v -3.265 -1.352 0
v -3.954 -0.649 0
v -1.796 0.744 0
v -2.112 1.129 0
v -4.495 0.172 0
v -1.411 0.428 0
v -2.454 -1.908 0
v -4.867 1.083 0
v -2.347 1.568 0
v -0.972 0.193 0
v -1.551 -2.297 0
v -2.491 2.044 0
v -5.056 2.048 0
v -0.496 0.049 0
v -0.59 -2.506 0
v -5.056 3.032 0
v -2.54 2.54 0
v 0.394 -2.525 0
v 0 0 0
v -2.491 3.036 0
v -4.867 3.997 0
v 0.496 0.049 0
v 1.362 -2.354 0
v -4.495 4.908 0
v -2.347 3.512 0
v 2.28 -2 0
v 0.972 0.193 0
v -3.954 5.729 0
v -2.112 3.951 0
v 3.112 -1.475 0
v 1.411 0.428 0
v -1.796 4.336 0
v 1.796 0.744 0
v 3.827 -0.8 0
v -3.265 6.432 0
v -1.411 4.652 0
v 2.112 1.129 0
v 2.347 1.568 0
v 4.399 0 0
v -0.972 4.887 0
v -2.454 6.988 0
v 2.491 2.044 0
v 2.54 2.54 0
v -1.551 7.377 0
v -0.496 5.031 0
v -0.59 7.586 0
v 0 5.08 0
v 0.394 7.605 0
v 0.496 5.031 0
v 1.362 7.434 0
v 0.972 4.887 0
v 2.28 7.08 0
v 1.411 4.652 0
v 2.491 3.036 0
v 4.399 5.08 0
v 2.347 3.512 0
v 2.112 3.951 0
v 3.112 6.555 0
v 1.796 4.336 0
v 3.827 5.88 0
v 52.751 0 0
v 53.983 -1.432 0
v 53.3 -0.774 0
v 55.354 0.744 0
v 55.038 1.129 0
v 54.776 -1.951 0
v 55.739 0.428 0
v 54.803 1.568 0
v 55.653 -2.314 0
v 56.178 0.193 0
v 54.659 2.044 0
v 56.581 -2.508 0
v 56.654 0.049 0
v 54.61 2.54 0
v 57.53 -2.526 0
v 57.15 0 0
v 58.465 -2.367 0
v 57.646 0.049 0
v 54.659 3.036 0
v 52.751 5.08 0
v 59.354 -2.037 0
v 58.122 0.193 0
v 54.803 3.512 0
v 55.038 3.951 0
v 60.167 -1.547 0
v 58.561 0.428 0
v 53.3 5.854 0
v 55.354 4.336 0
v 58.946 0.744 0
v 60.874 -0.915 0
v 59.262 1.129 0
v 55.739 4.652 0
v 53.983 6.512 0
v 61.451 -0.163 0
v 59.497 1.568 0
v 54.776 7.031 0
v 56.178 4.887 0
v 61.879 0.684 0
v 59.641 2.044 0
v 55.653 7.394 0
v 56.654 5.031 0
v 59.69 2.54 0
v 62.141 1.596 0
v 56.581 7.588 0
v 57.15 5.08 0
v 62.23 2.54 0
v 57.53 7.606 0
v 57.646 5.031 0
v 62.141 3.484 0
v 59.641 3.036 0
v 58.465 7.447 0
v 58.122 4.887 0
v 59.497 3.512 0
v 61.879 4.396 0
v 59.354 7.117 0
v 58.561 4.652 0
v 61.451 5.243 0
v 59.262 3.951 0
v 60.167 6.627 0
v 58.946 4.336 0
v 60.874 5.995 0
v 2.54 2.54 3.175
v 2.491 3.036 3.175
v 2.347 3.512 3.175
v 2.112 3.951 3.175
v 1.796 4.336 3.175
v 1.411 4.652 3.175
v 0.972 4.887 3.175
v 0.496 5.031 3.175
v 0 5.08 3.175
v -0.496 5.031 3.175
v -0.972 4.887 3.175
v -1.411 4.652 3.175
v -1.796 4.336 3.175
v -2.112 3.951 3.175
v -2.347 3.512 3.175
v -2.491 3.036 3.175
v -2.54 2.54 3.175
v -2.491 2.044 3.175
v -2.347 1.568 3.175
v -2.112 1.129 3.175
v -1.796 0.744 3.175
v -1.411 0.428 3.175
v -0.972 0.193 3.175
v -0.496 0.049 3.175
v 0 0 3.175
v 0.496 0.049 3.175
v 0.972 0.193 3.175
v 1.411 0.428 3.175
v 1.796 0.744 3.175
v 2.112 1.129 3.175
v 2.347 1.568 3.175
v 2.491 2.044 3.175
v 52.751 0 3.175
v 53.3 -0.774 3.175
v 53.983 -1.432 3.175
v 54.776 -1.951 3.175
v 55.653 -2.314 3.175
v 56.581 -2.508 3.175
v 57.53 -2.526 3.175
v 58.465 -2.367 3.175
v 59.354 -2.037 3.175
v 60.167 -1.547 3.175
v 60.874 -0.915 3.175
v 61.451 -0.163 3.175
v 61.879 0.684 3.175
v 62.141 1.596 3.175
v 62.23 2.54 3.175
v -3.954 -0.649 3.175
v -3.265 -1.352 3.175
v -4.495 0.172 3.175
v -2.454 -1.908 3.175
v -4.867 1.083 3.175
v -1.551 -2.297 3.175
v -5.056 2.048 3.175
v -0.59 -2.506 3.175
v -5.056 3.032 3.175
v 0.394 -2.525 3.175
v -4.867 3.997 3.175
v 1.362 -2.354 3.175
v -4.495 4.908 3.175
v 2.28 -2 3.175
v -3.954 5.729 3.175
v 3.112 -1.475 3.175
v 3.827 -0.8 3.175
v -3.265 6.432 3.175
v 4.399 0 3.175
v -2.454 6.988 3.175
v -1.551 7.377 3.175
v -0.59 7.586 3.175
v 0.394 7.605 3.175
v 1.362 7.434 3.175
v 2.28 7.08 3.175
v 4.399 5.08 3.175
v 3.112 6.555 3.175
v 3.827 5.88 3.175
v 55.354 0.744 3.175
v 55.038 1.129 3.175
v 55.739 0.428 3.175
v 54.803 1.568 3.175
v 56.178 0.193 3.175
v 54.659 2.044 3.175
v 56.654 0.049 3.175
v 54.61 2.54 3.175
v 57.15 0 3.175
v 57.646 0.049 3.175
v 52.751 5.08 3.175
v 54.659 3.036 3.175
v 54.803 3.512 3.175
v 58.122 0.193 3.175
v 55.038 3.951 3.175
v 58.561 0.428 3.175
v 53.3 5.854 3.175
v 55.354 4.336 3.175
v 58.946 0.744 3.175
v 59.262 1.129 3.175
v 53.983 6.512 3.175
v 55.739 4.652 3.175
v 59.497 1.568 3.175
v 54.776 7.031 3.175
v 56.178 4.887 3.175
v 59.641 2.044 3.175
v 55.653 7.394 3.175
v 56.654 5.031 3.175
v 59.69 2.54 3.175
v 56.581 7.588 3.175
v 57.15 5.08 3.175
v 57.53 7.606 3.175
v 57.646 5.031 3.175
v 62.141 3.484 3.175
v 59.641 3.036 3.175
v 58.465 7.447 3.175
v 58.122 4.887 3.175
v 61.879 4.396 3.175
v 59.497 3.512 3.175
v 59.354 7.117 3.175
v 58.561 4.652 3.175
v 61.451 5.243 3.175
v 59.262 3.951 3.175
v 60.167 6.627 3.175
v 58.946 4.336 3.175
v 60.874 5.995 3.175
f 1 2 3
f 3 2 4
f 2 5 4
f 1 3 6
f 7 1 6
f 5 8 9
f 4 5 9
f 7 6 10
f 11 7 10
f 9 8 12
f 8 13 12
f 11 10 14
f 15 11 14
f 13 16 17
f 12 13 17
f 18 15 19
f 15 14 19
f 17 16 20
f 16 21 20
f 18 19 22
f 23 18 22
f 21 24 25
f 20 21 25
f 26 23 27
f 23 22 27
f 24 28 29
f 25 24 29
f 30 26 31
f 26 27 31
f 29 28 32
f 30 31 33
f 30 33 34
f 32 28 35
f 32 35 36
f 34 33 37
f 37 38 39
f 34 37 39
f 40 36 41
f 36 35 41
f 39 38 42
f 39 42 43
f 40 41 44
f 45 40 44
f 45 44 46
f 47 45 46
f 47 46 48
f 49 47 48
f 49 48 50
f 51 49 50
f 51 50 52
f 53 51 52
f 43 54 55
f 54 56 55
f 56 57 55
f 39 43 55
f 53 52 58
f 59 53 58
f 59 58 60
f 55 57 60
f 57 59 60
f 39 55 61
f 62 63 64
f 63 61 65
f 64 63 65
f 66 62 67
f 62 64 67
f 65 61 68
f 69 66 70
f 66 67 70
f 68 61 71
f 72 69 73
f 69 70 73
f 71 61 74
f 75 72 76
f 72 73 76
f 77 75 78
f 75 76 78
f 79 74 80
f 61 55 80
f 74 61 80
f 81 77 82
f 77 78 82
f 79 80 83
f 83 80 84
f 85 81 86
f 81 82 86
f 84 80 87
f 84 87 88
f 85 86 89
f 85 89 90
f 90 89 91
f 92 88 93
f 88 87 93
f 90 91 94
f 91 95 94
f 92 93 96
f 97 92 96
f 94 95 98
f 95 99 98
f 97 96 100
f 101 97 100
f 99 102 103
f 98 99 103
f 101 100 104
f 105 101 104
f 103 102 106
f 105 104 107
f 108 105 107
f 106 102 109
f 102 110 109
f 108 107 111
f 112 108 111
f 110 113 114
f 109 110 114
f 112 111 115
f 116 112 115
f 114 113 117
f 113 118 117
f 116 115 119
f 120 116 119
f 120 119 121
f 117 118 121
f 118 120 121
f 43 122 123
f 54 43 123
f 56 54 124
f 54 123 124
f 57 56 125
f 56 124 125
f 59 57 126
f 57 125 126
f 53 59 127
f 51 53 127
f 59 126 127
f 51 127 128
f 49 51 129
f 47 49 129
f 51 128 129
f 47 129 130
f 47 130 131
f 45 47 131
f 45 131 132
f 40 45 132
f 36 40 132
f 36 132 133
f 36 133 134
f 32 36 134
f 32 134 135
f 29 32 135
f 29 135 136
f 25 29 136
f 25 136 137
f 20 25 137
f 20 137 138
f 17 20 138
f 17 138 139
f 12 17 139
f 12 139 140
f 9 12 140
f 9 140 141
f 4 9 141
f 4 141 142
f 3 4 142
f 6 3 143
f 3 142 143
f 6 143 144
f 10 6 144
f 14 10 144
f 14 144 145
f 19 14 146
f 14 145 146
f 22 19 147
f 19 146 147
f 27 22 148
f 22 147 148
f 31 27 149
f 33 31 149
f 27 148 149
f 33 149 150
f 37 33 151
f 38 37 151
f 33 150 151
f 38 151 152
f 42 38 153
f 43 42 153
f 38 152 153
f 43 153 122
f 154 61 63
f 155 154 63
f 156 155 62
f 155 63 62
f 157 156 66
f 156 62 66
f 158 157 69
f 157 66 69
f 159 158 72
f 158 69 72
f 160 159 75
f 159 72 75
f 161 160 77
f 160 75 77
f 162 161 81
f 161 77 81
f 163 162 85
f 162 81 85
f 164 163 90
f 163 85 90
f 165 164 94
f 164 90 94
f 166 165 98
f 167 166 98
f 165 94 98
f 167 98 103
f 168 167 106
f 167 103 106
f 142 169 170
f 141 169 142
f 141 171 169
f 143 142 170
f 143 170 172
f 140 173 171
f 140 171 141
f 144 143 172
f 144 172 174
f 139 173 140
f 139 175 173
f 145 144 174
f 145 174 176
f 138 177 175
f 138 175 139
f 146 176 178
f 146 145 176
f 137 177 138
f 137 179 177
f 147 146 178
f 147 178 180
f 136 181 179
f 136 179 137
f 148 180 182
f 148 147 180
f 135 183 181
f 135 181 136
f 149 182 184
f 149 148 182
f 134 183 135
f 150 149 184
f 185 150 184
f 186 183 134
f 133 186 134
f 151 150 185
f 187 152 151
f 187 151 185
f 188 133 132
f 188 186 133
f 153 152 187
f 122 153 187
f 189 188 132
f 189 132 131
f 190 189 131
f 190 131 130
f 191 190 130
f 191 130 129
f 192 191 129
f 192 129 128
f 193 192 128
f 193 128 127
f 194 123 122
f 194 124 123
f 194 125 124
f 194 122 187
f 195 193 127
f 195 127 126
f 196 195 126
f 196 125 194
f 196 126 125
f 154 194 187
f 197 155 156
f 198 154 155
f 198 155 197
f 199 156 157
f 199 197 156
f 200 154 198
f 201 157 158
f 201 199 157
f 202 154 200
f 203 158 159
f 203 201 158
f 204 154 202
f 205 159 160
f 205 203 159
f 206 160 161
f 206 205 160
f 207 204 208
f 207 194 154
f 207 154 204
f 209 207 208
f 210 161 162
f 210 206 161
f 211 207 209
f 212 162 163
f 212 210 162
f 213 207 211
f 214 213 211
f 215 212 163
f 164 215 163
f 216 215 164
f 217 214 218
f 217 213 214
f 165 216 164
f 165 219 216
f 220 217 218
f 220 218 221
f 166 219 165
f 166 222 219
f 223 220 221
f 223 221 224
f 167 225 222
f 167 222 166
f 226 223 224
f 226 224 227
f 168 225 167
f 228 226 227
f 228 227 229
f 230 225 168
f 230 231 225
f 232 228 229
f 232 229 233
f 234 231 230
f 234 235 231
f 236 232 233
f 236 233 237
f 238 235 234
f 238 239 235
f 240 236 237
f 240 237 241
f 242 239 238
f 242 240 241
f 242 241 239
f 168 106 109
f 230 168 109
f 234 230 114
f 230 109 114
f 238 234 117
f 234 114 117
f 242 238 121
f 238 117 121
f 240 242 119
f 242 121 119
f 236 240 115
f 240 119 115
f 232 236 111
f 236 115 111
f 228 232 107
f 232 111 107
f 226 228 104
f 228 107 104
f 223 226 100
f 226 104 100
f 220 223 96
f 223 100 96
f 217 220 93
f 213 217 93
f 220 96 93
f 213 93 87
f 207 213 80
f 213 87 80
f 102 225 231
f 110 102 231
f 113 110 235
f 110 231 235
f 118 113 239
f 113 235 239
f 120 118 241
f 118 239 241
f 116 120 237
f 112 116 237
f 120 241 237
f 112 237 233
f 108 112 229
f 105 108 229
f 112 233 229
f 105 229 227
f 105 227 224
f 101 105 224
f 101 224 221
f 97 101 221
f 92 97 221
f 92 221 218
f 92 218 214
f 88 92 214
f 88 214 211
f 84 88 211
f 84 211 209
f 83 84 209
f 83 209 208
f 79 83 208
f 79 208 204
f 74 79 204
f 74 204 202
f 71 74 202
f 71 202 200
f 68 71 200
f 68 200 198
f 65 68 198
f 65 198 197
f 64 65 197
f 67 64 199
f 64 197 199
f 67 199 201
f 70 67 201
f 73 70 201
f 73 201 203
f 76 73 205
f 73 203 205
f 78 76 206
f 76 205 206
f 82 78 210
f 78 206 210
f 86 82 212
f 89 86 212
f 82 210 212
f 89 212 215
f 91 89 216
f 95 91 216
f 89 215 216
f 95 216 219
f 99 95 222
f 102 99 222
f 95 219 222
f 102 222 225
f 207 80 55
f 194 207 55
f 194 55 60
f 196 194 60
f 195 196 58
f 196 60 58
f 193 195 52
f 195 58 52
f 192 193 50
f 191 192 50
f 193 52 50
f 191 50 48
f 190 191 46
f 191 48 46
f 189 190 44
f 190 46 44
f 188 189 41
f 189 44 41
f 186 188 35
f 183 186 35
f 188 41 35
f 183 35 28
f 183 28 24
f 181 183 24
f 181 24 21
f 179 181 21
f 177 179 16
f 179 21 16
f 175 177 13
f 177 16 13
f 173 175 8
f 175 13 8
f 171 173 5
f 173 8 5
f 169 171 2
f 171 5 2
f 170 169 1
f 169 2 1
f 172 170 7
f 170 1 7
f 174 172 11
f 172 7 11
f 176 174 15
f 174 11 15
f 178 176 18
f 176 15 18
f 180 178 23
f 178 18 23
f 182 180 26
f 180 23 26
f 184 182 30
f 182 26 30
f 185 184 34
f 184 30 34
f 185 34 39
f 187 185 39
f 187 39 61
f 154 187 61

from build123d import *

# Parameters (mm, degrees)
BOSS_EXTRUDE1_DEPTH = 3.175
SKETCH2_R           = 2.54
CUT_EXTRUDE1_DEPTH  = 63.775137794


with BuildPart() as part:
    # Sketch1 → Boss-Extrude1 (new body)
    with BuildSketch(Plane.XY):
        with BuildLine():
            Line((0, 5.08), (0, 0))
            Line((0, 0), (4.399409051, 0))
            ThreePointArc((4.399409051, 0), (4.906903198, 1.225199251), (5.08, 2.54))
            ThreePointArc((5.08, 2.54), (4.906903198, 3.854800749), (4.399409051, 5.08))
            Line((4.399409051, 5.08), (0, 5.08))
        make_face()
        with BuildLine():
            Line((4.399409051, 0), (0, 0))
            Line((0, 0), (0, 5.08))
            Line((0, 5.08), (4.399409051, 5.08))
            ThreePointArc((4.399409051, 5.08), (-5.08, 2.54), (4.399409051, 0))
        make_face()
        with BuildLine():
            ThreePointArc((5.08, 2.54), (4.906903198, 1.225199251), (4.399409051, 0))
            Line((4.399409051, 0), (52.750590949, 0))
            ThreePointArc((52.750590949, 0), (52.07, 2.54), (52.750590949, 5.08))
            Line((52.750590949, 5.08), (4.399409051, 5.08))
            ThreePointArc((4.399409051, 5.08), (4.906903198, 3.854800749), (5.08, 2.54))
        make_face()
        with BuildLine():
            ThreePointArc((52.750590949, 5.08), (52.07, 2.54), (52.750590949, 0))
            Line((52.750590949, 0), (57.15, 0))
            Line((57.15, 0), (57.15, 5.08))
            Line((57.15, 5.08), (52.750590949, 5.08))
        make_face()
        with BuildLine():
            Line((57.15, 0), (52.750590949, 0))
            ThreePointArc((52.750590949, 0), (58.464800749, -2.366903198), (62.23, 2.54))
            ThreePointArc((62.23, 2.54), (58.464800749, 7.446903198), (52.750590949, 5.08))
            Line((52.750590949, 5.08), (57.15, 5.08))
            Line((57.15, 5.08), (57.15, 0))
        make_face()
    extrude(amount=BOSS_EXTRUDE1_DEPTH)

    # Sketch2 → Cut-Extrude1 (cut, through all)
    with BuildSketch(Plane.XY.offset(3.175)):
        with Locations((0, 2.54)):
            Circle(SKETCH2_R)
        with Locations((57.15, 2.54)):
            Circle(SKETCH2_R)
    extrude(amount=-CUT_EXTRUDE1_DEPTH, mode=Mode.SUBTRACT)


solid = part.part
